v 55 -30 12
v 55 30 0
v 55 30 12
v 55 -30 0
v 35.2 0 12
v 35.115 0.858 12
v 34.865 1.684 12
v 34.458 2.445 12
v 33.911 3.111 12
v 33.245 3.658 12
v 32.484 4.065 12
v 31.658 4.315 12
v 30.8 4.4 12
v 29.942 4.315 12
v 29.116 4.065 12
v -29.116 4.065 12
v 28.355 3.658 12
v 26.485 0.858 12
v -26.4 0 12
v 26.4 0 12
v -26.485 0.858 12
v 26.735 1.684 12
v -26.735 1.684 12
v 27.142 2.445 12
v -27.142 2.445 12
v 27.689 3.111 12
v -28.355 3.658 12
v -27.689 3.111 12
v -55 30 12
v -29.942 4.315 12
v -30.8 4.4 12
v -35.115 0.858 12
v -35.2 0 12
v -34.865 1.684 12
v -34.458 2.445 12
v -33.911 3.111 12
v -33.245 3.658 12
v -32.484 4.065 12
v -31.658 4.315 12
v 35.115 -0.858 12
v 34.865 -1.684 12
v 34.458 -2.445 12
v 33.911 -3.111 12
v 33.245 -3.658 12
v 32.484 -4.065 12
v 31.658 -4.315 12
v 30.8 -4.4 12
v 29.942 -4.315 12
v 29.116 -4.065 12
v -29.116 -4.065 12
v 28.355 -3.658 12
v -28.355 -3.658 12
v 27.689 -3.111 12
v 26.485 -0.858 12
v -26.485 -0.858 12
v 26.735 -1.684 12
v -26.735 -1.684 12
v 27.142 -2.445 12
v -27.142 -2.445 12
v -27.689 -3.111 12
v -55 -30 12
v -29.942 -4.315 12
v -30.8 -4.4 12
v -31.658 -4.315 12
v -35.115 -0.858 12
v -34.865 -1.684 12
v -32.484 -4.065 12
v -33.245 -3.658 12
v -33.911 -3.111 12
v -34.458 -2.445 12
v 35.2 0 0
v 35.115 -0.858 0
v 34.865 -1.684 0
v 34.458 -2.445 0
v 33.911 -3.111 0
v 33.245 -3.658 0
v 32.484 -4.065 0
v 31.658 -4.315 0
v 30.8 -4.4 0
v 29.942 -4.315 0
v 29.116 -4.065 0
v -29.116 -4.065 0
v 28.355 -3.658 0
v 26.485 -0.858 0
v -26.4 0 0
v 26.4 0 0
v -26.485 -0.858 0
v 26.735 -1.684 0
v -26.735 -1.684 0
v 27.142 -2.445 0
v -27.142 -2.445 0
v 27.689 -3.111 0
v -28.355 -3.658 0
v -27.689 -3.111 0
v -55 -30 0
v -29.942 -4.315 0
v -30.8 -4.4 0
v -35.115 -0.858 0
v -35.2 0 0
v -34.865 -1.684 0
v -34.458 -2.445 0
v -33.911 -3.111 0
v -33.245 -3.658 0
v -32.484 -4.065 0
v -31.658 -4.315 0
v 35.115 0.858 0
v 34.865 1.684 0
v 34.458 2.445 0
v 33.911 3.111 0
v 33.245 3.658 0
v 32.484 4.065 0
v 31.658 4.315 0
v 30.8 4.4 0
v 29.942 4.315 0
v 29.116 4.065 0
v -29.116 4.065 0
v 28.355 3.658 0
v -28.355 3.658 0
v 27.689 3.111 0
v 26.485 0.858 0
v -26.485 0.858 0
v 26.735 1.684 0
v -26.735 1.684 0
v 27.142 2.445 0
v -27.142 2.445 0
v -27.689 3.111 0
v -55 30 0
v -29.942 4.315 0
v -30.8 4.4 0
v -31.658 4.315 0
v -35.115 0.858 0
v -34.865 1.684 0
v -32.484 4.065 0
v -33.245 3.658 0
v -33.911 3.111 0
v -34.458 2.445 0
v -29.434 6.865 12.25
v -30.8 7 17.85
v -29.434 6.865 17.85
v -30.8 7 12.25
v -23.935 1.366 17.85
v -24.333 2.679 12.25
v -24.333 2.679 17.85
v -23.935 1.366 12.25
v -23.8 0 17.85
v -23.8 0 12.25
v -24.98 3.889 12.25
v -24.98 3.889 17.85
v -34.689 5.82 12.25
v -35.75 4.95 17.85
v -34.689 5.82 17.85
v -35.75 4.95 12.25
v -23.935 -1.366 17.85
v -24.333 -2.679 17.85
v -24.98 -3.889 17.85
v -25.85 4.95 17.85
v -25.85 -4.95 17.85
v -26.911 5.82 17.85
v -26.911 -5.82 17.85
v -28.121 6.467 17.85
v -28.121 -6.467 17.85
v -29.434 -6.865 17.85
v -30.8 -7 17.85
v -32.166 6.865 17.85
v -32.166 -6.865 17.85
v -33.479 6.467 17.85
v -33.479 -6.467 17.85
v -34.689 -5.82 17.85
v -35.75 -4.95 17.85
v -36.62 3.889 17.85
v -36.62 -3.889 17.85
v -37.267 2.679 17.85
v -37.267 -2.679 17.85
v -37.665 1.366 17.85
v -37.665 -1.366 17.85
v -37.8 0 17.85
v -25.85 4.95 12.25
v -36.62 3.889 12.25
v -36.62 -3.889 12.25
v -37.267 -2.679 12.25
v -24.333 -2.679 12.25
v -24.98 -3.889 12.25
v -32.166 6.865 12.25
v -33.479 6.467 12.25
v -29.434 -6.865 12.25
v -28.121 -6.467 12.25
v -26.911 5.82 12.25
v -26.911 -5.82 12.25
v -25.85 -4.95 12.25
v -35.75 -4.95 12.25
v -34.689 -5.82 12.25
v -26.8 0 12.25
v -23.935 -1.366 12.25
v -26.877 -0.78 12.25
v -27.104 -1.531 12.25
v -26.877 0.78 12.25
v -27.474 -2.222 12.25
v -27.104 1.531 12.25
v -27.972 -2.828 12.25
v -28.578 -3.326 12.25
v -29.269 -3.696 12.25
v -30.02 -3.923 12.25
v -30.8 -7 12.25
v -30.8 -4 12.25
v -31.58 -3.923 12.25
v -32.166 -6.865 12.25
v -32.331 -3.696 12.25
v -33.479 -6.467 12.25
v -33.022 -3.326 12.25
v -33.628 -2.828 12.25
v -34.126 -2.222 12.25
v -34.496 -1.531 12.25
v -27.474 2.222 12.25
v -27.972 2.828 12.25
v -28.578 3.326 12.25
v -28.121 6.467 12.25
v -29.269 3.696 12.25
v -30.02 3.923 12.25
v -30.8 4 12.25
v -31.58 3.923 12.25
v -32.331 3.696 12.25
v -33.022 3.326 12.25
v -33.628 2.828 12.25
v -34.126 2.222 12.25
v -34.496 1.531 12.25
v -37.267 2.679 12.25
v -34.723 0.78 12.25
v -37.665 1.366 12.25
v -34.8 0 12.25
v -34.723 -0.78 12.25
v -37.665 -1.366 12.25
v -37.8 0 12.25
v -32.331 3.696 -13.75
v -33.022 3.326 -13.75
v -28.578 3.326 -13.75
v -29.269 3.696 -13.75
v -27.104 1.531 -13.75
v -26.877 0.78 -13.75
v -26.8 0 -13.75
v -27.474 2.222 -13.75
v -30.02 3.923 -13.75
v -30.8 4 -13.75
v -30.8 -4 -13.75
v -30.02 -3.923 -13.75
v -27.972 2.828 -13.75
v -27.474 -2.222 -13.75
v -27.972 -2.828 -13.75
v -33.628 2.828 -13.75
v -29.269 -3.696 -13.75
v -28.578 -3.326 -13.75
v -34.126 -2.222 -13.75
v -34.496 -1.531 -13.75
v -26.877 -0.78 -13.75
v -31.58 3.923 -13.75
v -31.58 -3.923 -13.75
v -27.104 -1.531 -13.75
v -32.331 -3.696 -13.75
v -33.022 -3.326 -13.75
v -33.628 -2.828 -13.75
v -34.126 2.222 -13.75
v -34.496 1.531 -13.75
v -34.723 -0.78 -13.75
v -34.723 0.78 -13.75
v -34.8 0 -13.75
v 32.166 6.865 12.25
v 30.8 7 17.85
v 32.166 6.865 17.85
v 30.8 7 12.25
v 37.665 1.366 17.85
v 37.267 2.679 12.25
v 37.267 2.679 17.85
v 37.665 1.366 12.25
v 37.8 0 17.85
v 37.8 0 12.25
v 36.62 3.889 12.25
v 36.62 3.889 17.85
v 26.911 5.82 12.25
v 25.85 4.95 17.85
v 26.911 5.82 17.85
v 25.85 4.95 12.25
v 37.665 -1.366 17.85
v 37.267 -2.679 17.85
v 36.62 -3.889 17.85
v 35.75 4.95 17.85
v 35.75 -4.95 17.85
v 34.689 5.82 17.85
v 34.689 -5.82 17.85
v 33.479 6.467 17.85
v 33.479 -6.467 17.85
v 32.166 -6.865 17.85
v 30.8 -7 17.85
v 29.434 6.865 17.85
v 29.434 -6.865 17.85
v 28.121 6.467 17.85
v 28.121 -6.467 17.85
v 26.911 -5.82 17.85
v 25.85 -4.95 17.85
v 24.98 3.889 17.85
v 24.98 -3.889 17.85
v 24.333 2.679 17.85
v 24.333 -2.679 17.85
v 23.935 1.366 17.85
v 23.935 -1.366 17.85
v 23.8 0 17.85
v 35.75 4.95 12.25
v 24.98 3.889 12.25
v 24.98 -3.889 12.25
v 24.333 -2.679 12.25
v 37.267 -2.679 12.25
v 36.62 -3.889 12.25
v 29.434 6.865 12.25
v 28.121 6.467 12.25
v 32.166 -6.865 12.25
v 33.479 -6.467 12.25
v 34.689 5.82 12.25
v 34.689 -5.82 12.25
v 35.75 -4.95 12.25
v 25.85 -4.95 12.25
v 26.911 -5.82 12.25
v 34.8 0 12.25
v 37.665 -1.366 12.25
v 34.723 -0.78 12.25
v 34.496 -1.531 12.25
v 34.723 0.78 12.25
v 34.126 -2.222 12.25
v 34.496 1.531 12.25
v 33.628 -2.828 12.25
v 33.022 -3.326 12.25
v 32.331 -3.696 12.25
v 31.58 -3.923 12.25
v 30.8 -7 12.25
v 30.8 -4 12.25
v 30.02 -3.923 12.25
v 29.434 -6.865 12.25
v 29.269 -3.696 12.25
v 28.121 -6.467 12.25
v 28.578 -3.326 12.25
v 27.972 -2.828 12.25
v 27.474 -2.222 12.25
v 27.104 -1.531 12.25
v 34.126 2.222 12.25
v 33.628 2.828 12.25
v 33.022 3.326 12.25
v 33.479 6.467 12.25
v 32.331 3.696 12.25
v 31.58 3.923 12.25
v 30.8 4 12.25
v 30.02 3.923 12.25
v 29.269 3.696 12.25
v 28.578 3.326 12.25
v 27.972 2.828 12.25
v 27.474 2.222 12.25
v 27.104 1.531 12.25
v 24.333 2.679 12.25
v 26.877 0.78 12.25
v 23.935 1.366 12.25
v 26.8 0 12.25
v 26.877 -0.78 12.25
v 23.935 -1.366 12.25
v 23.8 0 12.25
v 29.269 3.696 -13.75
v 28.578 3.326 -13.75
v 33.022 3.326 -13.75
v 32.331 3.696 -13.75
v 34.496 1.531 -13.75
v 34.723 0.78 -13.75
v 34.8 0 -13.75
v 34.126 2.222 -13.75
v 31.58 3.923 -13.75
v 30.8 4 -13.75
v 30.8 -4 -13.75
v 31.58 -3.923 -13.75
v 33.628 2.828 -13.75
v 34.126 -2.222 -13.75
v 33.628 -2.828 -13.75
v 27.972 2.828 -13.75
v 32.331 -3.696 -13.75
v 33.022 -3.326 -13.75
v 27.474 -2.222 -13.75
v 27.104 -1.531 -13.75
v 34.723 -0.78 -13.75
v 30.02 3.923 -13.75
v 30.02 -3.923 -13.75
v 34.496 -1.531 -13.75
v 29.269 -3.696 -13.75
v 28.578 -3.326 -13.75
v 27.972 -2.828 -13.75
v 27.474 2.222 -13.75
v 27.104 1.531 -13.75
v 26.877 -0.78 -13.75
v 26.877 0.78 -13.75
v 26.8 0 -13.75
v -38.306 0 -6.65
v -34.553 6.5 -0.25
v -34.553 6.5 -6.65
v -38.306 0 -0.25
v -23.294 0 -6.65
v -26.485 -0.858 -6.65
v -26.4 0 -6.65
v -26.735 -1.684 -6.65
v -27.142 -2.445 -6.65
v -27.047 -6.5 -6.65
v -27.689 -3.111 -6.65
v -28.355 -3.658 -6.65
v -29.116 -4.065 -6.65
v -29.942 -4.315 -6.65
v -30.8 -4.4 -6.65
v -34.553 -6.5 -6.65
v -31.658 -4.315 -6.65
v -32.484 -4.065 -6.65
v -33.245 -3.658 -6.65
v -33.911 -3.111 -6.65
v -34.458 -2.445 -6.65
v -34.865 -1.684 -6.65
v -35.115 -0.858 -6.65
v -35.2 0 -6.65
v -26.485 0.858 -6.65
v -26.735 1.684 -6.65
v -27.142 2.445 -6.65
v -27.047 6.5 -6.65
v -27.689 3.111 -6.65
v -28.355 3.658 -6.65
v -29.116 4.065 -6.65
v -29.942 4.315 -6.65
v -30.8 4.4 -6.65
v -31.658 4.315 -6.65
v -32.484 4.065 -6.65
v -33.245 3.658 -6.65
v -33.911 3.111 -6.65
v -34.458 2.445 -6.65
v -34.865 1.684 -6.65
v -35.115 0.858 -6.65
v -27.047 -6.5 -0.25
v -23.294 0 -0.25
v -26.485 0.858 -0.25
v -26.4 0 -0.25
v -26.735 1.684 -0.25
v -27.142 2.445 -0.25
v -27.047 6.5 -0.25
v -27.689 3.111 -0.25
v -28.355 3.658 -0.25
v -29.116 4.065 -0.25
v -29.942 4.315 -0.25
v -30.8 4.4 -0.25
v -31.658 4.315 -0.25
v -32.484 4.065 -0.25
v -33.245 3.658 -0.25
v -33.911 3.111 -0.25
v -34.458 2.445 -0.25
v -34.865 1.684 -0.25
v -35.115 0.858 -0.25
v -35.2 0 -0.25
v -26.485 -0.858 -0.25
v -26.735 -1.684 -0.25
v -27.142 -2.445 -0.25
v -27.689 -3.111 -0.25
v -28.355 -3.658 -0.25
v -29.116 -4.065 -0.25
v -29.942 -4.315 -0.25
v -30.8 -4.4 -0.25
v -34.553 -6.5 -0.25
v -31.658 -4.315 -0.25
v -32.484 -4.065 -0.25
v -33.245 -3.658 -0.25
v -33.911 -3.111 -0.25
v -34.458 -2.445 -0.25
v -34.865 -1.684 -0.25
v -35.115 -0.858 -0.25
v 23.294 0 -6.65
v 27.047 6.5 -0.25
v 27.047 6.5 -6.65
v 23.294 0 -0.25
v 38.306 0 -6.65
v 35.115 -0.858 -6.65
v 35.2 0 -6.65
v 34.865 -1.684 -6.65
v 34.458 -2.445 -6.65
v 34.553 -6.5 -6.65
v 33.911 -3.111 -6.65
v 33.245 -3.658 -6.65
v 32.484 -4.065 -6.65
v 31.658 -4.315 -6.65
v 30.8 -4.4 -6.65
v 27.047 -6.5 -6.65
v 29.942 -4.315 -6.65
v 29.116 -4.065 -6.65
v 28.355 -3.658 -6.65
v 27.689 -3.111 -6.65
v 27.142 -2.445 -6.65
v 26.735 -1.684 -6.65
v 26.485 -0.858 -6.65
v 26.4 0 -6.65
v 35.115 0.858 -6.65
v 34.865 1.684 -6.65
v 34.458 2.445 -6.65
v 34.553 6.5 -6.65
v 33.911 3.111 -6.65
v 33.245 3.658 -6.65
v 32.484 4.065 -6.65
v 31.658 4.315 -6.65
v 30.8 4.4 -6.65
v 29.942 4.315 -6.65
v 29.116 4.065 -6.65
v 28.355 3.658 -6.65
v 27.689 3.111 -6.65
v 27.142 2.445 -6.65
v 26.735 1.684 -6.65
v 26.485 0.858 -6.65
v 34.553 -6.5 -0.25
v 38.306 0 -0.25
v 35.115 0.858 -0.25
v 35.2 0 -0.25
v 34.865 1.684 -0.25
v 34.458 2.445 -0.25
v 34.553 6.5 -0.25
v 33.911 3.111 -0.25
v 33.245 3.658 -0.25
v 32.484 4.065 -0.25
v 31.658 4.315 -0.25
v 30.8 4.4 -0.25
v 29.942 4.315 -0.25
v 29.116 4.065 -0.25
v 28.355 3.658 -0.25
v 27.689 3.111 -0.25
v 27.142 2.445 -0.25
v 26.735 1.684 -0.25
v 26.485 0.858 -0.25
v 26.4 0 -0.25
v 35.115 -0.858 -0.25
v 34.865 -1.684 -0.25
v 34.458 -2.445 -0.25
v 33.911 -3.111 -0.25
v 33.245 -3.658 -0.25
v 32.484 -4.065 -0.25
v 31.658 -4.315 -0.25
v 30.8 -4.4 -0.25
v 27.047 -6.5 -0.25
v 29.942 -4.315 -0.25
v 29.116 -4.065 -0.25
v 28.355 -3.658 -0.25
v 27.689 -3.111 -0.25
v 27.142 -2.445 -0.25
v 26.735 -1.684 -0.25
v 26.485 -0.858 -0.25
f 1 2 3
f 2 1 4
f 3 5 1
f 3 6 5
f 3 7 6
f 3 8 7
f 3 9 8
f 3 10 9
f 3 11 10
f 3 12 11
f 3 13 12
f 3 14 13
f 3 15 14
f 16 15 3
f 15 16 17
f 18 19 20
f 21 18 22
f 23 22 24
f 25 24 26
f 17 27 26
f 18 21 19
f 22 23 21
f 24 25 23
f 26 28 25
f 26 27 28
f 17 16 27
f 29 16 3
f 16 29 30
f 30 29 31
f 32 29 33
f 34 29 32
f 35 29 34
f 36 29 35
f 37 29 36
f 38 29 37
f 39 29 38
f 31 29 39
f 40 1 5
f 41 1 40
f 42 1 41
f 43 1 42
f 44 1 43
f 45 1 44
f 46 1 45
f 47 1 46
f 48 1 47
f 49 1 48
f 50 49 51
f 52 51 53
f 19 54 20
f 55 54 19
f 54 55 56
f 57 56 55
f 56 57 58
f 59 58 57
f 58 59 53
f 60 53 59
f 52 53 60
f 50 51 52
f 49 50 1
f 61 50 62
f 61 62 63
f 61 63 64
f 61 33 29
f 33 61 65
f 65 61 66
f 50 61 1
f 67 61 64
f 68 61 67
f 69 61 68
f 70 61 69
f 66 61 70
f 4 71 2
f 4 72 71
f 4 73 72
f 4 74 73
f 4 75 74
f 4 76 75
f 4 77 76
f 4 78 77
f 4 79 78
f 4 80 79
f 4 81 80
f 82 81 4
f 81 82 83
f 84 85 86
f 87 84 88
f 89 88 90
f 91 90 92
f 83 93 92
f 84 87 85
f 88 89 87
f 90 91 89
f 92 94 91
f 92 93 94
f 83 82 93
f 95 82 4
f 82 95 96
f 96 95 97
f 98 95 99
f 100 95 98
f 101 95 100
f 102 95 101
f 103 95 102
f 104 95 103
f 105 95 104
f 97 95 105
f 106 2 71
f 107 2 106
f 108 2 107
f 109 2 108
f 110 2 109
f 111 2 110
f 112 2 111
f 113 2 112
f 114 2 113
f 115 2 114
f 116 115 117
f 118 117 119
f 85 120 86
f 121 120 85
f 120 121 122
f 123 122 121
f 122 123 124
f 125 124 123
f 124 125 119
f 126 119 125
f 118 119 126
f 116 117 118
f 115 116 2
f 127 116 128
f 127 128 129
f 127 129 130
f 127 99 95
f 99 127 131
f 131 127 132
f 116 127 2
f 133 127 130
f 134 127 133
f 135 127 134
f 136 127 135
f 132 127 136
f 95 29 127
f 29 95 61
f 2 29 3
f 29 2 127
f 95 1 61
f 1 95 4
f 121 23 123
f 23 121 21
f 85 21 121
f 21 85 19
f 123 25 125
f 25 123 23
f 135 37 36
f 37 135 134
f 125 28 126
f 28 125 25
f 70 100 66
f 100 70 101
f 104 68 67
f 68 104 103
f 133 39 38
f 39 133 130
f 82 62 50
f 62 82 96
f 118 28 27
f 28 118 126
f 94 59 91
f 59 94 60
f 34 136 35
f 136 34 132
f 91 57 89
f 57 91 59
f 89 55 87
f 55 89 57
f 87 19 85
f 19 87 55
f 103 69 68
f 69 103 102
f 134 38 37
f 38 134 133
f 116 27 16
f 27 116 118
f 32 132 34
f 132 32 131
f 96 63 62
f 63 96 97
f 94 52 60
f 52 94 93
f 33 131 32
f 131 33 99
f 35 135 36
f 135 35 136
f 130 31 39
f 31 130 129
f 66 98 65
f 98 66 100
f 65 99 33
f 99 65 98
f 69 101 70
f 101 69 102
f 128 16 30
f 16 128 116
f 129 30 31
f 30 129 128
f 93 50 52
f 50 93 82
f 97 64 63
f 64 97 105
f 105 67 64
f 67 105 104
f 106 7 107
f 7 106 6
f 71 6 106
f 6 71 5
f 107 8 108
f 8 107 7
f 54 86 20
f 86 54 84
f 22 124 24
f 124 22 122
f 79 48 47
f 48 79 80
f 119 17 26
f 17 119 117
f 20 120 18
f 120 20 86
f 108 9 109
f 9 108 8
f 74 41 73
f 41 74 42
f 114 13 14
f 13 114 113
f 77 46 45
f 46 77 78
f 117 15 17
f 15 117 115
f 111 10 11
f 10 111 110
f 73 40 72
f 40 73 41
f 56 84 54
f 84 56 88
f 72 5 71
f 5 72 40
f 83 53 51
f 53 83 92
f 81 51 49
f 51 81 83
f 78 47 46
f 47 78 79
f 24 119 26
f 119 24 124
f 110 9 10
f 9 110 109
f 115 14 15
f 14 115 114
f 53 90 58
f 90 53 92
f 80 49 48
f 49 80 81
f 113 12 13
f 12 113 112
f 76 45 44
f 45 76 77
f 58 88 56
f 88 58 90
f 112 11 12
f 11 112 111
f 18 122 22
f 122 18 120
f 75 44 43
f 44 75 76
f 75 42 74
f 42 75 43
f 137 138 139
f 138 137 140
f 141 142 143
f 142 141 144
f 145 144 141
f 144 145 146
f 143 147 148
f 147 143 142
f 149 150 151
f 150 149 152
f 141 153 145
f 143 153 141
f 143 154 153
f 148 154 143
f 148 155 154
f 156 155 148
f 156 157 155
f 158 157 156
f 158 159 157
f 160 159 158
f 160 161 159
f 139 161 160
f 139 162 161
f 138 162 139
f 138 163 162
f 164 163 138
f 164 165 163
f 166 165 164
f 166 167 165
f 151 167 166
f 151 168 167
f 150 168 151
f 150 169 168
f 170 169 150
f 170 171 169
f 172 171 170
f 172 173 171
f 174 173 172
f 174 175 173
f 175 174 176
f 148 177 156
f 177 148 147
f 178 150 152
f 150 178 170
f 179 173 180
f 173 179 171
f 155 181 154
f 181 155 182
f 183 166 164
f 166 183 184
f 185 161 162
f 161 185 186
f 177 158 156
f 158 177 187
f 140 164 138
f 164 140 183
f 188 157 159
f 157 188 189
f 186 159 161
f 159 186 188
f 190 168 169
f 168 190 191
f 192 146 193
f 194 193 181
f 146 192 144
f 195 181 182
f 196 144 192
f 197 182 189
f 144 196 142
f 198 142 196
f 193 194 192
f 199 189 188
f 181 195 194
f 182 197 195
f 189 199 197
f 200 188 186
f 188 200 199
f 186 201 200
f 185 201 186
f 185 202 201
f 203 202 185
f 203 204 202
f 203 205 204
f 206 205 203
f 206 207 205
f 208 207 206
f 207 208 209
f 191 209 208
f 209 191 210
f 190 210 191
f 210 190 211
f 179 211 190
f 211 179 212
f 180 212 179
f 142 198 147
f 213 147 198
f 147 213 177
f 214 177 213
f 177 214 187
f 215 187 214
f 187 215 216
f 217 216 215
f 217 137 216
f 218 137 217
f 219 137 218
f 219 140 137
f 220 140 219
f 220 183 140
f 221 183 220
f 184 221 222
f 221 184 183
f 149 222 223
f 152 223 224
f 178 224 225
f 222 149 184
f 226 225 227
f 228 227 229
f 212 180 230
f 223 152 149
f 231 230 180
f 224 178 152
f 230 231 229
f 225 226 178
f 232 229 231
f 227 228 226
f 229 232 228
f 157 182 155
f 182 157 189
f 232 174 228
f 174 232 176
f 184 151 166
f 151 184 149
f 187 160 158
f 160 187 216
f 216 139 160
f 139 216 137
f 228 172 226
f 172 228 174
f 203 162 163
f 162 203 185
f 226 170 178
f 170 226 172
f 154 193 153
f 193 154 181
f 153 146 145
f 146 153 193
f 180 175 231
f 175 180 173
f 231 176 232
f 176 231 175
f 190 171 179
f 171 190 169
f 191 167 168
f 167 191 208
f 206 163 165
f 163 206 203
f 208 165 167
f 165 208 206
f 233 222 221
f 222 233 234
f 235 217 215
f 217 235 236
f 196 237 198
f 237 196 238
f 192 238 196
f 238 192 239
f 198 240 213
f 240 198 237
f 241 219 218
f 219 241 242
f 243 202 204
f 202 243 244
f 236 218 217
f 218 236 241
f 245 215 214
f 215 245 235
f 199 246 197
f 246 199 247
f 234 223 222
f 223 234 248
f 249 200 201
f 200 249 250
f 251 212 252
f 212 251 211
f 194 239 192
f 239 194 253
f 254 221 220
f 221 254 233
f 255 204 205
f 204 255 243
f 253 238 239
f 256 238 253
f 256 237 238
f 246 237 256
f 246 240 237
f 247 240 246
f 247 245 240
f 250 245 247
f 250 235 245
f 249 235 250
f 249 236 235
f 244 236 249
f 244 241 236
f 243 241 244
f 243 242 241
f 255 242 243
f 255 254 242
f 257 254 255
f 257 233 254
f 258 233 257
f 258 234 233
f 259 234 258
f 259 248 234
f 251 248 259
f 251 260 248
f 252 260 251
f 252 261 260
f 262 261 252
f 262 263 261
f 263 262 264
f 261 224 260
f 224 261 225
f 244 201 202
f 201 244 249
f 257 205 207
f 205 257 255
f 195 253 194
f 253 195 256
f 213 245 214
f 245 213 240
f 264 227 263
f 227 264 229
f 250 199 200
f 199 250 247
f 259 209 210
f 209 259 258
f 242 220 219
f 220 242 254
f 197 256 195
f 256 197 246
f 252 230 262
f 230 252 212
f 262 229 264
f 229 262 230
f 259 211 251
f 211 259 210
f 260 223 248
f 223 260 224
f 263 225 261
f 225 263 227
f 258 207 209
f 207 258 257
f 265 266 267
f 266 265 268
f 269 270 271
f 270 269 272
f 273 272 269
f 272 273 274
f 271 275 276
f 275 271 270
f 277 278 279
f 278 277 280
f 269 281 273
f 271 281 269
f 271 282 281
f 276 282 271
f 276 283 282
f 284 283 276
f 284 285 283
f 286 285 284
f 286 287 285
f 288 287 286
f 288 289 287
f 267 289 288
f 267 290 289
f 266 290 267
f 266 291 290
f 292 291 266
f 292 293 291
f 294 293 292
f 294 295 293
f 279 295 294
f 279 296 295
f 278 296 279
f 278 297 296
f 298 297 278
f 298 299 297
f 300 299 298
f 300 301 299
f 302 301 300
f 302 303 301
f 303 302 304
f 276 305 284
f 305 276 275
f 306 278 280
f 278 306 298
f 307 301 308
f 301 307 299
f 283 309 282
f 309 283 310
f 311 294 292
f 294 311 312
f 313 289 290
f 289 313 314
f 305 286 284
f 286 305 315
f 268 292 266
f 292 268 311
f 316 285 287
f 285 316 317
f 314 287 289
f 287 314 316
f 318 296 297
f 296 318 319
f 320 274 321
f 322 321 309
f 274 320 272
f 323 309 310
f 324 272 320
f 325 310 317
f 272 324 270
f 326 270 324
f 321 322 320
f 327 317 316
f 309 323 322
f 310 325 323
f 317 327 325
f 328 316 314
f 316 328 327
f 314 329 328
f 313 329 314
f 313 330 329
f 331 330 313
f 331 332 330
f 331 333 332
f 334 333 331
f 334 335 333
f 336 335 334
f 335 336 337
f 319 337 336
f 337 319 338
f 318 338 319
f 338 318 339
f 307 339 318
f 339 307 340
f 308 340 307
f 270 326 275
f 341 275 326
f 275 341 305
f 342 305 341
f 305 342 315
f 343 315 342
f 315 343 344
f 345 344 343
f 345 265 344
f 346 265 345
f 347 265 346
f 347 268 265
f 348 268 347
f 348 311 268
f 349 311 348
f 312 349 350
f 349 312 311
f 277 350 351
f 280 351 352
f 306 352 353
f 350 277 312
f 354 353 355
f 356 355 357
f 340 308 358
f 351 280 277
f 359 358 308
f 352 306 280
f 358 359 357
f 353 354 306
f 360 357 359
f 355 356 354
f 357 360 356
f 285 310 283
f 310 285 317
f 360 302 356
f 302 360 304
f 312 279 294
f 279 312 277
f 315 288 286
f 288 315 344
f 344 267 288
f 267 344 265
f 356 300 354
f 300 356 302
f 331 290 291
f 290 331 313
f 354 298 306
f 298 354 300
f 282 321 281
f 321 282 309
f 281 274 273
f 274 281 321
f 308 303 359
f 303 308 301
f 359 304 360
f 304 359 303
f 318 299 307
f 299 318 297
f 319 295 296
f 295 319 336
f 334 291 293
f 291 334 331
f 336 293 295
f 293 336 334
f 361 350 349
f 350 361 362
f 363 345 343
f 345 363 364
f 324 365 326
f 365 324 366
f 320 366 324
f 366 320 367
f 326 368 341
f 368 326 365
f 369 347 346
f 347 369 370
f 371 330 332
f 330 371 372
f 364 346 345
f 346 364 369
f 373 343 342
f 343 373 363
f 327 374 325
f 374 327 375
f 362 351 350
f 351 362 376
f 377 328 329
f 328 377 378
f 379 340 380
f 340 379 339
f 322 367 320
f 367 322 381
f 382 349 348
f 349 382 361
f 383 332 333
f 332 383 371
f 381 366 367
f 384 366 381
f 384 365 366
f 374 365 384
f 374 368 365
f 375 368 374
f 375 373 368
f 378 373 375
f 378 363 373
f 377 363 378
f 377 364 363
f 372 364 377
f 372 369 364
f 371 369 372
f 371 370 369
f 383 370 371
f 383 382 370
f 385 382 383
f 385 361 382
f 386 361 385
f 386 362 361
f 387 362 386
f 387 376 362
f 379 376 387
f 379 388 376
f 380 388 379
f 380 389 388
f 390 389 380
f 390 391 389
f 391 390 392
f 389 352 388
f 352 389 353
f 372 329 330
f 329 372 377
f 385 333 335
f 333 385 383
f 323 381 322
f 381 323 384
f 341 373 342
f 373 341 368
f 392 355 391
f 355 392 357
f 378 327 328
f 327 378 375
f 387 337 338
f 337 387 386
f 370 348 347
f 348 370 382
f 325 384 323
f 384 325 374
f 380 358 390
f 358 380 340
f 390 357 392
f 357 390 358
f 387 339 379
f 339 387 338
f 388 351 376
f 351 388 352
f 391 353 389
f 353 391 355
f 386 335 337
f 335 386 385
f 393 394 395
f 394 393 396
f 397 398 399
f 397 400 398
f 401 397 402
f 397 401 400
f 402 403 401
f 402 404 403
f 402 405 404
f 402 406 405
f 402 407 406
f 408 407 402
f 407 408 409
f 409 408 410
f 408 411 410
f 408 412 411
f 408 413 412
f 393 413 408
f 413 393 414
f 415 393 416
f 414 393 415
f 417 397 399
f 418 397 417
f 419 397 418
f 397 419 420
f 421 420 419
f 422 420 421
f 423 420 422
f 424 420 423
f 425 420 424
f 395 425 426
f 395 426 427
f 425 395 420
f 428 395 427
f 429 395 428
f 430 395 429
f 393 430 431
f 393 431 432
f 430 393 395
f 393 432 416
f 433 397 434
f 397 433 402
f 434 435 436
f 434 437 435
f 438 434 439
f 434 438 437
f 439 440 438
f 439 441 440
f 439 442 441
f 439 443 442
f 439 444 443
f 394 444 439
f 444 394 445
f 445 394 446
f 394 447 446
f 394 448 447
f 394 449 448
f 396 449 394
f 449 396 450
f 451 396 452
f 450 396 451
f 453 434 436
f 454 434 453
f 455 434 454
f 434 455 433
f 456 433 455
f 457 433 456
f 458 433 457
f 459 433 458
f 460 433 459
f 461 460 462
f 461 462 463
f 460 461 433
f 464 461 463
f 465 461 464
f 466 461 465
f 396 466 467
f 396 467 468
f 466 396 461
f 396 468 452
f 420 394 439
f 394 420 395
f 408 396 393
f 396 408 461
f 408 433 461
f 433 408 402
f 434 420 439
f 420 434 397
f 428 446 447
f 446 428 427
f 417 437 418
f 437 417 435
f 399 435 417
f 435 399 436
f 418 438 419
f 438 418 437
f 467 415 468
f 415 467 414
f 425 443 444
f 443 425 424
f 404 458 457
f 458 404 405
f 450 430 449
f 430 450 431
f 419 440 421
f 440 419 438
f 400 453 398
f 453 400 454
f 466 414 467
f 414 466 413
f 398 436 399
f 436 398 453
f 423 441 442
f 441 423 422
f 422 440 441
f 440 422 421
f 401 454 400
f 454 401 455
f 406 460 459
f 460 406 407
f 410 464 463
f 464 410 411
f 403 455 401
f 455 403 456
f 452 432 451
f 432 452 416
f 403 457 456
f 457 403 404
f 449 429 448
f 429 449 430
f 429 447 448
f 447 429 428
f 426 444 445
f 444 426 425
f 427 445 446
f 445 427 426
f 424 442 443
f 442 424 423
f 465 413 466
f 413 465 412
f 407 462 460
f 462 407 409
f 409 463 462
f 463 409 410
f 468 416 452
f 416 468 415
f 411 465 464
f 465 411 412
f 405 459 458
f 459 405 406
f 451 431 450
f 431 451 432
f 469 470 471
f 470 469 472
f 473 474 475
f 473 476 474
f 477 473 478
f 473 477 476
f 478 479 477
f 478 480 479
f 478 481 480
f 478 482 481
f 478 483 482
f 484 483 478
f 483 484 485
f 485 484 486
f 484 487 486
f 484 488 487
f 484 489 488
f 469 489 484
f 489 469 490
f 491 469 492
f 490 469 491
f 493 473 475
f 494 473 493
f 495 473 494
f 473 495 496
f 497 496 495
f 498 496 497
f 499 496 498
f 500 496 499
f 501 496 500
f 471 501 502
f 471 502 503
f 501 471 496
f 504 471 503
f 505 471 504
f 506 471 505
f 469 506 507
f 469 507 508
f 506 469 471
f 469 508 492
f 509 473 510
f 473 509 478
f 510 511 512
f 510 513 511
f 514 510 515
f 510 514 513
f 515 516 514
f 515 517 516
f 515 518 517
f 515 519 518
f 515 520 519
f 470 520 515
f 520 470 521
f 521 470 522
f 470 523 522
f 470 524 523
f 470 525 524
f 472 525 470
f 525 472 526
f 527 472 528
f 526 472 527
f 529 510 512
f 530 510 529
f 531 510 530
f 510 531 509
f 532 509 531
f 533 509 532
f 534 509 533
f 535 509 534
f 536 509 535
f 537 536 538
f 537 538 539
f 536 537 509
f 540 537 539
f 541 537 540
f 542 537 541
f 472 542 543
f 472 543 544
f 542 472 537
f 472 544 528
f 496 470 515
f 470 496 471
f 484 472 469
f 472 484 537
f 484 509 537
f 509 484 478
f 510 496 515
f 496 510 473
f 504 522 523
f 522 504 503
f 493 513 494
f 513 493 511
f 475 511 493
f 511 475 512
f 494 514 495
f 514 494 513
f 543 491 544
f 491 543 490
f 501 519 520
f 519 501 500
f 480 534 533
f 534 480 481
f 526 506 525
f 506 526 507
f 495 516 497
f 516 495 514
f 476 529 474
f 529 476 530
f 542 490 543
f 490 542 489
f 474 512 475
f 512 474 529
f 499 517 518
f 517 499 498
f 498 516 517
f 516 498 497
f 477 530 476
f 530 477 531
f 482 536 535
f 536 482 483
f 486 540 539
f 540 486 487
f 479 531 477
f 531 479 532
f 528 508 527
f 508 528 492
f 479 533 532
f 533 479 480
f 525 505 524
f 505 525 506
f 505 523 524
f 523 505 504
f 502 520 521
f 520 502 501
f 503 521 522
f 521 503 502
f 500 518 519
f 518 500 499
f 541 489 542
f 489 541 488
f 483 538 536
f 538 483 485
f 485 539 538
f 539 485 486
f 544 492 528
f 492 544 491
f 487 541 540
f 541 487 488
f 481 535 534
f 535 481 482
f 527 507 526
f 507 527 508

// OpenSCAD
$fn = 32;

// ------------------------------------------------------------------------
// Bolted plate: 110 x 60 x 12 mm plate, 2 fasteners
// Every part is its own module, assembly() places them once.
// ------------------------------------------------------------------------

// --- part 1 ---
module plate() {
  difference() {
    translate([-55, -30, 0]) cube([110, 60, 12]);
    translate([-30.8, 0, -1]) cylinder(h = 14, d = 8.8);
    translate([30.8, 0, -1]) cylinder(h = 14, d = 8.8);
  }
}

// --- part 2 ---
module bolt1() {
  cylinder(h = 5.6, d = 14);
  translate([0, 0, -26]) cylinder(h = 26, d = 8);
}

// --- part 3 ---
module bolt2() {
  cylinder(h = 5.6, d = 14);
  translate([0, 0, -26]) cylinder(h = 26, d = 8);
}

// --- part 4 ---
module nut1() {
  difference() {
    linear_extrude(height = 6.4) polygon(points = [[7.506, 0], [3.753, 6.5], [-3.753, 6.5], [-7.506, 0], [-3.753, -6.5], [3.753, -6.5]]);
    translate([0, 0, -1]) cylinder(h = 8.4, d = 8.8);
  }
}

// --- part 5 ---
module nut2() {
  difference() {
    linear_extrude(height = 6.4) polygon(points = [[7.506, 0], [3.753, 6.5], [-3.753, 6.5], [-7.506, 0], [-3.753, -6.5], [3.753, -6.5]]);
    translate([0, 0, -1]) cylinder(h = 8.4, d = 8.8);
  }
}

// --- assembly ---
module assembly() {
  translate([0, 0, 0]) rotate([0, 0, 0]) plate();
  translate([-30.8, 0, 12.25]) rotate([0, 0, 0]) bolt1();
  translate([30.8, 0, 12.25]) rotate([0, 0, 0]) bolt2();
  translate([-30.8, 0, -6.65]) rotate([0, 0, 0]) nut1();
  translate([30.8, 0, -6.65]) rotate([0, 0, 0]) nut2();
}

assembly();
